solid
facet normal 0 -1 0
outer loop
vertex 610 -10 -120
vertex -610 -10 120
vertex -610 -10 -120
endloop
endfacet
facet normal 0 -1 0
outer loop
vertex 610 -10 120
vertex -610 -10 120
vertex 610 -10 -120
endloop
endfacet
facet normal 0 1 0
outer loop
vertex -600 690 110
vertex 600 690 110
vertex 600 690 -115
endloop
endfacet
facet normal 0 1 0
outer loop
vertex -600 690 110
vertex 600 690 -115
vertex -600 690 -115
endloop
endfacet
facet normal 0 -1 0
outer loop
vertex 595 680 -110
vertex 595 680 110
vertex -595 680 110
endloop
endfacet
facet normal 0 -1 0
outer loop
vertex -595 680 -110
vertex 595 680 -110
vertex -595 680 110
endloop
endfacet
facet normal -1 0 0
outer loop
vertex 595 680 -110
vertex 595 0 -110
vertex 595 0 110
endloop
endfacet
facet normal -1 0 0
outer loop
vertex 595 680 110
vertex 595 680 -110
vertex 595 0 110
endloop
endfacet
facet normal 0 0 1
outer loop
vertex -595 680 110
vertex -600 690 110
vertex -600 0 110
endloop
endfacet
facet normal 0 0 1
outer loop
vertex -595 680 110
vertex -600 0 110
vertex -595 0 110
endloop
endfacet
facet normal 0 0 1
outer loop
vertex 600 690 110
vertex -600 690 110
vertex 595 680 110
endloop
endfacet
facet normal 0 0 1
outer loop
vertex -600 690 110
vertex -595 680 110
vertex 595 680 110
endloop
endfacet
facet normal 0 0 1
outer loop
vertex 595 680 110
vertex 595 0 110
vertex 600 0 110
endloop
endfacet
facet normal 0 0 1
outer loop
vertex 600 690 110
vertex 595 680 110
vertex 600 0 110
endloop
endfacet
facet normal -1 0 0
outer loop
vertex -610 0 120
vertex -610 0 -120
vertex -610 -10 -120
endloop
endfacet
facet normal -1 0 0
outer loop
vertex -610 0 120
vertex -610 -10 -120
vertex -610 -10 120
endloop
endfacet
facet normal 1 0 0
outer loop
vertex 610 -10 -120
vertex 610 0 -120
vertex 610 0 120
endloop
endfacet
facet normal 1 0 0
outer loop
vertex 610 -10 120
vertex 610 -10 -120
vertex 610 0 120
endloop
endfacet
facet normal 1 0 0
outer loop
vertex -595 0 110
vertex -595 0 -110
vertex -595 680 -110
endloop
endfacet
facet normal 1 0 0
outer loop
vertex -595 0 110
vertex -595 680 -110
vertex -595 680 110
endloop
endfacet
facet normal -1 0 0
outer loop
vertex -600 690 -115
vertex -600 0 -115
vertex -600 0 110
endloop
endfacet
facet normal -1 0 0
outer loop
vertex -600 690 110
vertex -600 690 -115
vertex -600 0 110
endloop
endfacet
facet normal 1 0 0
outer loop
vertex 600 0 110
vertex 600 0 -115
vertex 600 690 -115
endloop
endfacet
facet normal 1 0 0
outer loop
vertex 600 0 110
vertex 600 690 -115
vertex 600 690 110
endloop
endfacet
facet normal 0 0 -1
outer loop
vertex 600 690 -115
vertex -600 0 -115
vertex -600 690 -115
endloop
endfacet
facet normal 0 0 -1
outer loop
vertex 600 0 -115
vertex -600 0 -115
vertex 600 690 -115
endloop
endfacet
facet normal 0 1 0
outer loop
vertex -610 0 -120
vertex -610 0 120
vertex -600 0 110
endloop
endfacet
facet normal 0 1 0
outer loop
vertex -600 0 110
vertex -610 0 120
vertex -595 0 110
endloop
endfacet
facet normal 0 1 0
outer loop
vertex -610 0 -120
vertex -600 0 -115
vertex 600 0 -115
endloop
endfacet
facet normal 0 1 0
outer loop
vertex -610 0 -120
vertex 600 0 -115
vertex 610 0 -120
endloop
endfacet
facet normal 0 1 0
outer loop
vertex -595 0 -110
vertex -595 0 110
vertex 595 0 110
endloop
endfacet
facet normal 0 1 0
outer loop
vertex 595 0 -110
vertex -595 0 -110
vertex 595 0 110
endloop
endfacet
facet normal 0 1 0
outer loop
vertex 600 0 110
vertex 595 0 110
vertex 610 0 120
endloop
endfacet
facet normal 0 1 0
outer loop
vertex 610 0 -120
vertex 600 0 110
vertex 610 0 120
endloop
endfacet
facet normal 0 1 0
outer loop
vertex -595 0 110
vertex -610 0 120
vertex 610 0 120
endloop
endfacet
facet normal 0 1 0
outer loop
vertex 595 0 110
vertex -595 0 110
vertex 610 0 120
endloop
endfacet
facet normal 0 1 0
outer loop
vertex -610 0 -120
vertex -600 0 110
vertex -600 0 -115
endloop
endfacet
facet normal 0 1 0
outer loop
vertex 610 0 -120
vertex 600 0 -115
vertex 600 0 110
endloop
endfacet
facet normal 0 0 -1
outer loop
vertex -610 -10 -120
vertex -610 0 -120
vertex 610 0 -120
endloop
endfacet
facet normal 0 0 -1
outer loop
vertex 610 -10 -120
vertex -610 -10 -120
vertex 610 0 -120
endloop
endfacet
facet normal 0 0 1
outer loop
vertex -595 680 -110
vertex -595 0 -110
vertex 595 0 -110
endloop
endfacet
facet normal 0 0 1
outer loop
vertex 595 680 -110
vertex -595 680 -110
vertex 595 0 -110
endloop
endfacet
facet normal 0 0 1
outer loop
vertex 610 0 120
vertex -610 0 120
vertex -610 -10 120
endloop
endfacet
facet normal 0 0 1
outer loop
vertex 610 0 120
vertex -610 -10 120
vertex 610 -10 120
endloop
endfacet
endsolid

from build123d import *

# Parameters (mm, degrees)
F0_W     = 1220
F0_H     = 240
F1_DEPTH = 10
F2_W     = 5
F2_H     = 225
F3_DEPTH = 680
F4_W     = 1195
F4_H     = 225
F4_W_2   = 5
F5_DEPTH = 10
F6_W     = 1190
F6_H     = 680
F7_DEPTH = 5


# Not quite as in the source:
# - a pattern or mirror of a feature is missing from the dataset's text; its kind, count and spacing are read off the source's solid


with BuildPart() as f1:
    # F0 (on Front) → F1 (new body)
    with BuildSketch(Plane.XZ):
        Rectangle(F0_W, F0_H)
    extrude(amount=F1_DEPTH)

    # F2 (on face) → F3 (join)
    with BuildSketch(Plane(origin=(0, 0, 0), x_dir=(-1, 0, 0), z_dir=(0, 1, 0))):
        with Locations((-597.5, -2.5)):
            Rectangle(F2_W, F2_H)
    f3 = extrude(amount=F3_DEPTH)

    # F3_copies: F3 across plane
    add(f3.mirror(Plane(origin=(0, 0, 0), x_dir=(0, 0, -1), z_dir=(-1, 0, 0))))

    # F4 (on face) → F5 (join)
    with BuildSketch(Plane(origin=(0, 680, 0), x_dir=(-1, 0, 0), z_dir=(0, 1, 0))):
        with Locations((2.5, -2.5)):
            Rectangle(F4_W, F4_H)
        with Locations((-597.5, -2.5)):
            Rectangle(F4_W_2, F4_H)
    extrude(amount=F5_DEPTH)

    # F6 (on face) → F7 (join)
    with BuildSketch(Plane(origin=(0, 0, -115), x_dir=(1, 0, 0), z_dir=(0, 0, -1))):
        with Locations((0, -340)):
            Rectangle(F6_W, F6_H)
    extrude(amount=-F7_DEPTH)


solid = f1.part
